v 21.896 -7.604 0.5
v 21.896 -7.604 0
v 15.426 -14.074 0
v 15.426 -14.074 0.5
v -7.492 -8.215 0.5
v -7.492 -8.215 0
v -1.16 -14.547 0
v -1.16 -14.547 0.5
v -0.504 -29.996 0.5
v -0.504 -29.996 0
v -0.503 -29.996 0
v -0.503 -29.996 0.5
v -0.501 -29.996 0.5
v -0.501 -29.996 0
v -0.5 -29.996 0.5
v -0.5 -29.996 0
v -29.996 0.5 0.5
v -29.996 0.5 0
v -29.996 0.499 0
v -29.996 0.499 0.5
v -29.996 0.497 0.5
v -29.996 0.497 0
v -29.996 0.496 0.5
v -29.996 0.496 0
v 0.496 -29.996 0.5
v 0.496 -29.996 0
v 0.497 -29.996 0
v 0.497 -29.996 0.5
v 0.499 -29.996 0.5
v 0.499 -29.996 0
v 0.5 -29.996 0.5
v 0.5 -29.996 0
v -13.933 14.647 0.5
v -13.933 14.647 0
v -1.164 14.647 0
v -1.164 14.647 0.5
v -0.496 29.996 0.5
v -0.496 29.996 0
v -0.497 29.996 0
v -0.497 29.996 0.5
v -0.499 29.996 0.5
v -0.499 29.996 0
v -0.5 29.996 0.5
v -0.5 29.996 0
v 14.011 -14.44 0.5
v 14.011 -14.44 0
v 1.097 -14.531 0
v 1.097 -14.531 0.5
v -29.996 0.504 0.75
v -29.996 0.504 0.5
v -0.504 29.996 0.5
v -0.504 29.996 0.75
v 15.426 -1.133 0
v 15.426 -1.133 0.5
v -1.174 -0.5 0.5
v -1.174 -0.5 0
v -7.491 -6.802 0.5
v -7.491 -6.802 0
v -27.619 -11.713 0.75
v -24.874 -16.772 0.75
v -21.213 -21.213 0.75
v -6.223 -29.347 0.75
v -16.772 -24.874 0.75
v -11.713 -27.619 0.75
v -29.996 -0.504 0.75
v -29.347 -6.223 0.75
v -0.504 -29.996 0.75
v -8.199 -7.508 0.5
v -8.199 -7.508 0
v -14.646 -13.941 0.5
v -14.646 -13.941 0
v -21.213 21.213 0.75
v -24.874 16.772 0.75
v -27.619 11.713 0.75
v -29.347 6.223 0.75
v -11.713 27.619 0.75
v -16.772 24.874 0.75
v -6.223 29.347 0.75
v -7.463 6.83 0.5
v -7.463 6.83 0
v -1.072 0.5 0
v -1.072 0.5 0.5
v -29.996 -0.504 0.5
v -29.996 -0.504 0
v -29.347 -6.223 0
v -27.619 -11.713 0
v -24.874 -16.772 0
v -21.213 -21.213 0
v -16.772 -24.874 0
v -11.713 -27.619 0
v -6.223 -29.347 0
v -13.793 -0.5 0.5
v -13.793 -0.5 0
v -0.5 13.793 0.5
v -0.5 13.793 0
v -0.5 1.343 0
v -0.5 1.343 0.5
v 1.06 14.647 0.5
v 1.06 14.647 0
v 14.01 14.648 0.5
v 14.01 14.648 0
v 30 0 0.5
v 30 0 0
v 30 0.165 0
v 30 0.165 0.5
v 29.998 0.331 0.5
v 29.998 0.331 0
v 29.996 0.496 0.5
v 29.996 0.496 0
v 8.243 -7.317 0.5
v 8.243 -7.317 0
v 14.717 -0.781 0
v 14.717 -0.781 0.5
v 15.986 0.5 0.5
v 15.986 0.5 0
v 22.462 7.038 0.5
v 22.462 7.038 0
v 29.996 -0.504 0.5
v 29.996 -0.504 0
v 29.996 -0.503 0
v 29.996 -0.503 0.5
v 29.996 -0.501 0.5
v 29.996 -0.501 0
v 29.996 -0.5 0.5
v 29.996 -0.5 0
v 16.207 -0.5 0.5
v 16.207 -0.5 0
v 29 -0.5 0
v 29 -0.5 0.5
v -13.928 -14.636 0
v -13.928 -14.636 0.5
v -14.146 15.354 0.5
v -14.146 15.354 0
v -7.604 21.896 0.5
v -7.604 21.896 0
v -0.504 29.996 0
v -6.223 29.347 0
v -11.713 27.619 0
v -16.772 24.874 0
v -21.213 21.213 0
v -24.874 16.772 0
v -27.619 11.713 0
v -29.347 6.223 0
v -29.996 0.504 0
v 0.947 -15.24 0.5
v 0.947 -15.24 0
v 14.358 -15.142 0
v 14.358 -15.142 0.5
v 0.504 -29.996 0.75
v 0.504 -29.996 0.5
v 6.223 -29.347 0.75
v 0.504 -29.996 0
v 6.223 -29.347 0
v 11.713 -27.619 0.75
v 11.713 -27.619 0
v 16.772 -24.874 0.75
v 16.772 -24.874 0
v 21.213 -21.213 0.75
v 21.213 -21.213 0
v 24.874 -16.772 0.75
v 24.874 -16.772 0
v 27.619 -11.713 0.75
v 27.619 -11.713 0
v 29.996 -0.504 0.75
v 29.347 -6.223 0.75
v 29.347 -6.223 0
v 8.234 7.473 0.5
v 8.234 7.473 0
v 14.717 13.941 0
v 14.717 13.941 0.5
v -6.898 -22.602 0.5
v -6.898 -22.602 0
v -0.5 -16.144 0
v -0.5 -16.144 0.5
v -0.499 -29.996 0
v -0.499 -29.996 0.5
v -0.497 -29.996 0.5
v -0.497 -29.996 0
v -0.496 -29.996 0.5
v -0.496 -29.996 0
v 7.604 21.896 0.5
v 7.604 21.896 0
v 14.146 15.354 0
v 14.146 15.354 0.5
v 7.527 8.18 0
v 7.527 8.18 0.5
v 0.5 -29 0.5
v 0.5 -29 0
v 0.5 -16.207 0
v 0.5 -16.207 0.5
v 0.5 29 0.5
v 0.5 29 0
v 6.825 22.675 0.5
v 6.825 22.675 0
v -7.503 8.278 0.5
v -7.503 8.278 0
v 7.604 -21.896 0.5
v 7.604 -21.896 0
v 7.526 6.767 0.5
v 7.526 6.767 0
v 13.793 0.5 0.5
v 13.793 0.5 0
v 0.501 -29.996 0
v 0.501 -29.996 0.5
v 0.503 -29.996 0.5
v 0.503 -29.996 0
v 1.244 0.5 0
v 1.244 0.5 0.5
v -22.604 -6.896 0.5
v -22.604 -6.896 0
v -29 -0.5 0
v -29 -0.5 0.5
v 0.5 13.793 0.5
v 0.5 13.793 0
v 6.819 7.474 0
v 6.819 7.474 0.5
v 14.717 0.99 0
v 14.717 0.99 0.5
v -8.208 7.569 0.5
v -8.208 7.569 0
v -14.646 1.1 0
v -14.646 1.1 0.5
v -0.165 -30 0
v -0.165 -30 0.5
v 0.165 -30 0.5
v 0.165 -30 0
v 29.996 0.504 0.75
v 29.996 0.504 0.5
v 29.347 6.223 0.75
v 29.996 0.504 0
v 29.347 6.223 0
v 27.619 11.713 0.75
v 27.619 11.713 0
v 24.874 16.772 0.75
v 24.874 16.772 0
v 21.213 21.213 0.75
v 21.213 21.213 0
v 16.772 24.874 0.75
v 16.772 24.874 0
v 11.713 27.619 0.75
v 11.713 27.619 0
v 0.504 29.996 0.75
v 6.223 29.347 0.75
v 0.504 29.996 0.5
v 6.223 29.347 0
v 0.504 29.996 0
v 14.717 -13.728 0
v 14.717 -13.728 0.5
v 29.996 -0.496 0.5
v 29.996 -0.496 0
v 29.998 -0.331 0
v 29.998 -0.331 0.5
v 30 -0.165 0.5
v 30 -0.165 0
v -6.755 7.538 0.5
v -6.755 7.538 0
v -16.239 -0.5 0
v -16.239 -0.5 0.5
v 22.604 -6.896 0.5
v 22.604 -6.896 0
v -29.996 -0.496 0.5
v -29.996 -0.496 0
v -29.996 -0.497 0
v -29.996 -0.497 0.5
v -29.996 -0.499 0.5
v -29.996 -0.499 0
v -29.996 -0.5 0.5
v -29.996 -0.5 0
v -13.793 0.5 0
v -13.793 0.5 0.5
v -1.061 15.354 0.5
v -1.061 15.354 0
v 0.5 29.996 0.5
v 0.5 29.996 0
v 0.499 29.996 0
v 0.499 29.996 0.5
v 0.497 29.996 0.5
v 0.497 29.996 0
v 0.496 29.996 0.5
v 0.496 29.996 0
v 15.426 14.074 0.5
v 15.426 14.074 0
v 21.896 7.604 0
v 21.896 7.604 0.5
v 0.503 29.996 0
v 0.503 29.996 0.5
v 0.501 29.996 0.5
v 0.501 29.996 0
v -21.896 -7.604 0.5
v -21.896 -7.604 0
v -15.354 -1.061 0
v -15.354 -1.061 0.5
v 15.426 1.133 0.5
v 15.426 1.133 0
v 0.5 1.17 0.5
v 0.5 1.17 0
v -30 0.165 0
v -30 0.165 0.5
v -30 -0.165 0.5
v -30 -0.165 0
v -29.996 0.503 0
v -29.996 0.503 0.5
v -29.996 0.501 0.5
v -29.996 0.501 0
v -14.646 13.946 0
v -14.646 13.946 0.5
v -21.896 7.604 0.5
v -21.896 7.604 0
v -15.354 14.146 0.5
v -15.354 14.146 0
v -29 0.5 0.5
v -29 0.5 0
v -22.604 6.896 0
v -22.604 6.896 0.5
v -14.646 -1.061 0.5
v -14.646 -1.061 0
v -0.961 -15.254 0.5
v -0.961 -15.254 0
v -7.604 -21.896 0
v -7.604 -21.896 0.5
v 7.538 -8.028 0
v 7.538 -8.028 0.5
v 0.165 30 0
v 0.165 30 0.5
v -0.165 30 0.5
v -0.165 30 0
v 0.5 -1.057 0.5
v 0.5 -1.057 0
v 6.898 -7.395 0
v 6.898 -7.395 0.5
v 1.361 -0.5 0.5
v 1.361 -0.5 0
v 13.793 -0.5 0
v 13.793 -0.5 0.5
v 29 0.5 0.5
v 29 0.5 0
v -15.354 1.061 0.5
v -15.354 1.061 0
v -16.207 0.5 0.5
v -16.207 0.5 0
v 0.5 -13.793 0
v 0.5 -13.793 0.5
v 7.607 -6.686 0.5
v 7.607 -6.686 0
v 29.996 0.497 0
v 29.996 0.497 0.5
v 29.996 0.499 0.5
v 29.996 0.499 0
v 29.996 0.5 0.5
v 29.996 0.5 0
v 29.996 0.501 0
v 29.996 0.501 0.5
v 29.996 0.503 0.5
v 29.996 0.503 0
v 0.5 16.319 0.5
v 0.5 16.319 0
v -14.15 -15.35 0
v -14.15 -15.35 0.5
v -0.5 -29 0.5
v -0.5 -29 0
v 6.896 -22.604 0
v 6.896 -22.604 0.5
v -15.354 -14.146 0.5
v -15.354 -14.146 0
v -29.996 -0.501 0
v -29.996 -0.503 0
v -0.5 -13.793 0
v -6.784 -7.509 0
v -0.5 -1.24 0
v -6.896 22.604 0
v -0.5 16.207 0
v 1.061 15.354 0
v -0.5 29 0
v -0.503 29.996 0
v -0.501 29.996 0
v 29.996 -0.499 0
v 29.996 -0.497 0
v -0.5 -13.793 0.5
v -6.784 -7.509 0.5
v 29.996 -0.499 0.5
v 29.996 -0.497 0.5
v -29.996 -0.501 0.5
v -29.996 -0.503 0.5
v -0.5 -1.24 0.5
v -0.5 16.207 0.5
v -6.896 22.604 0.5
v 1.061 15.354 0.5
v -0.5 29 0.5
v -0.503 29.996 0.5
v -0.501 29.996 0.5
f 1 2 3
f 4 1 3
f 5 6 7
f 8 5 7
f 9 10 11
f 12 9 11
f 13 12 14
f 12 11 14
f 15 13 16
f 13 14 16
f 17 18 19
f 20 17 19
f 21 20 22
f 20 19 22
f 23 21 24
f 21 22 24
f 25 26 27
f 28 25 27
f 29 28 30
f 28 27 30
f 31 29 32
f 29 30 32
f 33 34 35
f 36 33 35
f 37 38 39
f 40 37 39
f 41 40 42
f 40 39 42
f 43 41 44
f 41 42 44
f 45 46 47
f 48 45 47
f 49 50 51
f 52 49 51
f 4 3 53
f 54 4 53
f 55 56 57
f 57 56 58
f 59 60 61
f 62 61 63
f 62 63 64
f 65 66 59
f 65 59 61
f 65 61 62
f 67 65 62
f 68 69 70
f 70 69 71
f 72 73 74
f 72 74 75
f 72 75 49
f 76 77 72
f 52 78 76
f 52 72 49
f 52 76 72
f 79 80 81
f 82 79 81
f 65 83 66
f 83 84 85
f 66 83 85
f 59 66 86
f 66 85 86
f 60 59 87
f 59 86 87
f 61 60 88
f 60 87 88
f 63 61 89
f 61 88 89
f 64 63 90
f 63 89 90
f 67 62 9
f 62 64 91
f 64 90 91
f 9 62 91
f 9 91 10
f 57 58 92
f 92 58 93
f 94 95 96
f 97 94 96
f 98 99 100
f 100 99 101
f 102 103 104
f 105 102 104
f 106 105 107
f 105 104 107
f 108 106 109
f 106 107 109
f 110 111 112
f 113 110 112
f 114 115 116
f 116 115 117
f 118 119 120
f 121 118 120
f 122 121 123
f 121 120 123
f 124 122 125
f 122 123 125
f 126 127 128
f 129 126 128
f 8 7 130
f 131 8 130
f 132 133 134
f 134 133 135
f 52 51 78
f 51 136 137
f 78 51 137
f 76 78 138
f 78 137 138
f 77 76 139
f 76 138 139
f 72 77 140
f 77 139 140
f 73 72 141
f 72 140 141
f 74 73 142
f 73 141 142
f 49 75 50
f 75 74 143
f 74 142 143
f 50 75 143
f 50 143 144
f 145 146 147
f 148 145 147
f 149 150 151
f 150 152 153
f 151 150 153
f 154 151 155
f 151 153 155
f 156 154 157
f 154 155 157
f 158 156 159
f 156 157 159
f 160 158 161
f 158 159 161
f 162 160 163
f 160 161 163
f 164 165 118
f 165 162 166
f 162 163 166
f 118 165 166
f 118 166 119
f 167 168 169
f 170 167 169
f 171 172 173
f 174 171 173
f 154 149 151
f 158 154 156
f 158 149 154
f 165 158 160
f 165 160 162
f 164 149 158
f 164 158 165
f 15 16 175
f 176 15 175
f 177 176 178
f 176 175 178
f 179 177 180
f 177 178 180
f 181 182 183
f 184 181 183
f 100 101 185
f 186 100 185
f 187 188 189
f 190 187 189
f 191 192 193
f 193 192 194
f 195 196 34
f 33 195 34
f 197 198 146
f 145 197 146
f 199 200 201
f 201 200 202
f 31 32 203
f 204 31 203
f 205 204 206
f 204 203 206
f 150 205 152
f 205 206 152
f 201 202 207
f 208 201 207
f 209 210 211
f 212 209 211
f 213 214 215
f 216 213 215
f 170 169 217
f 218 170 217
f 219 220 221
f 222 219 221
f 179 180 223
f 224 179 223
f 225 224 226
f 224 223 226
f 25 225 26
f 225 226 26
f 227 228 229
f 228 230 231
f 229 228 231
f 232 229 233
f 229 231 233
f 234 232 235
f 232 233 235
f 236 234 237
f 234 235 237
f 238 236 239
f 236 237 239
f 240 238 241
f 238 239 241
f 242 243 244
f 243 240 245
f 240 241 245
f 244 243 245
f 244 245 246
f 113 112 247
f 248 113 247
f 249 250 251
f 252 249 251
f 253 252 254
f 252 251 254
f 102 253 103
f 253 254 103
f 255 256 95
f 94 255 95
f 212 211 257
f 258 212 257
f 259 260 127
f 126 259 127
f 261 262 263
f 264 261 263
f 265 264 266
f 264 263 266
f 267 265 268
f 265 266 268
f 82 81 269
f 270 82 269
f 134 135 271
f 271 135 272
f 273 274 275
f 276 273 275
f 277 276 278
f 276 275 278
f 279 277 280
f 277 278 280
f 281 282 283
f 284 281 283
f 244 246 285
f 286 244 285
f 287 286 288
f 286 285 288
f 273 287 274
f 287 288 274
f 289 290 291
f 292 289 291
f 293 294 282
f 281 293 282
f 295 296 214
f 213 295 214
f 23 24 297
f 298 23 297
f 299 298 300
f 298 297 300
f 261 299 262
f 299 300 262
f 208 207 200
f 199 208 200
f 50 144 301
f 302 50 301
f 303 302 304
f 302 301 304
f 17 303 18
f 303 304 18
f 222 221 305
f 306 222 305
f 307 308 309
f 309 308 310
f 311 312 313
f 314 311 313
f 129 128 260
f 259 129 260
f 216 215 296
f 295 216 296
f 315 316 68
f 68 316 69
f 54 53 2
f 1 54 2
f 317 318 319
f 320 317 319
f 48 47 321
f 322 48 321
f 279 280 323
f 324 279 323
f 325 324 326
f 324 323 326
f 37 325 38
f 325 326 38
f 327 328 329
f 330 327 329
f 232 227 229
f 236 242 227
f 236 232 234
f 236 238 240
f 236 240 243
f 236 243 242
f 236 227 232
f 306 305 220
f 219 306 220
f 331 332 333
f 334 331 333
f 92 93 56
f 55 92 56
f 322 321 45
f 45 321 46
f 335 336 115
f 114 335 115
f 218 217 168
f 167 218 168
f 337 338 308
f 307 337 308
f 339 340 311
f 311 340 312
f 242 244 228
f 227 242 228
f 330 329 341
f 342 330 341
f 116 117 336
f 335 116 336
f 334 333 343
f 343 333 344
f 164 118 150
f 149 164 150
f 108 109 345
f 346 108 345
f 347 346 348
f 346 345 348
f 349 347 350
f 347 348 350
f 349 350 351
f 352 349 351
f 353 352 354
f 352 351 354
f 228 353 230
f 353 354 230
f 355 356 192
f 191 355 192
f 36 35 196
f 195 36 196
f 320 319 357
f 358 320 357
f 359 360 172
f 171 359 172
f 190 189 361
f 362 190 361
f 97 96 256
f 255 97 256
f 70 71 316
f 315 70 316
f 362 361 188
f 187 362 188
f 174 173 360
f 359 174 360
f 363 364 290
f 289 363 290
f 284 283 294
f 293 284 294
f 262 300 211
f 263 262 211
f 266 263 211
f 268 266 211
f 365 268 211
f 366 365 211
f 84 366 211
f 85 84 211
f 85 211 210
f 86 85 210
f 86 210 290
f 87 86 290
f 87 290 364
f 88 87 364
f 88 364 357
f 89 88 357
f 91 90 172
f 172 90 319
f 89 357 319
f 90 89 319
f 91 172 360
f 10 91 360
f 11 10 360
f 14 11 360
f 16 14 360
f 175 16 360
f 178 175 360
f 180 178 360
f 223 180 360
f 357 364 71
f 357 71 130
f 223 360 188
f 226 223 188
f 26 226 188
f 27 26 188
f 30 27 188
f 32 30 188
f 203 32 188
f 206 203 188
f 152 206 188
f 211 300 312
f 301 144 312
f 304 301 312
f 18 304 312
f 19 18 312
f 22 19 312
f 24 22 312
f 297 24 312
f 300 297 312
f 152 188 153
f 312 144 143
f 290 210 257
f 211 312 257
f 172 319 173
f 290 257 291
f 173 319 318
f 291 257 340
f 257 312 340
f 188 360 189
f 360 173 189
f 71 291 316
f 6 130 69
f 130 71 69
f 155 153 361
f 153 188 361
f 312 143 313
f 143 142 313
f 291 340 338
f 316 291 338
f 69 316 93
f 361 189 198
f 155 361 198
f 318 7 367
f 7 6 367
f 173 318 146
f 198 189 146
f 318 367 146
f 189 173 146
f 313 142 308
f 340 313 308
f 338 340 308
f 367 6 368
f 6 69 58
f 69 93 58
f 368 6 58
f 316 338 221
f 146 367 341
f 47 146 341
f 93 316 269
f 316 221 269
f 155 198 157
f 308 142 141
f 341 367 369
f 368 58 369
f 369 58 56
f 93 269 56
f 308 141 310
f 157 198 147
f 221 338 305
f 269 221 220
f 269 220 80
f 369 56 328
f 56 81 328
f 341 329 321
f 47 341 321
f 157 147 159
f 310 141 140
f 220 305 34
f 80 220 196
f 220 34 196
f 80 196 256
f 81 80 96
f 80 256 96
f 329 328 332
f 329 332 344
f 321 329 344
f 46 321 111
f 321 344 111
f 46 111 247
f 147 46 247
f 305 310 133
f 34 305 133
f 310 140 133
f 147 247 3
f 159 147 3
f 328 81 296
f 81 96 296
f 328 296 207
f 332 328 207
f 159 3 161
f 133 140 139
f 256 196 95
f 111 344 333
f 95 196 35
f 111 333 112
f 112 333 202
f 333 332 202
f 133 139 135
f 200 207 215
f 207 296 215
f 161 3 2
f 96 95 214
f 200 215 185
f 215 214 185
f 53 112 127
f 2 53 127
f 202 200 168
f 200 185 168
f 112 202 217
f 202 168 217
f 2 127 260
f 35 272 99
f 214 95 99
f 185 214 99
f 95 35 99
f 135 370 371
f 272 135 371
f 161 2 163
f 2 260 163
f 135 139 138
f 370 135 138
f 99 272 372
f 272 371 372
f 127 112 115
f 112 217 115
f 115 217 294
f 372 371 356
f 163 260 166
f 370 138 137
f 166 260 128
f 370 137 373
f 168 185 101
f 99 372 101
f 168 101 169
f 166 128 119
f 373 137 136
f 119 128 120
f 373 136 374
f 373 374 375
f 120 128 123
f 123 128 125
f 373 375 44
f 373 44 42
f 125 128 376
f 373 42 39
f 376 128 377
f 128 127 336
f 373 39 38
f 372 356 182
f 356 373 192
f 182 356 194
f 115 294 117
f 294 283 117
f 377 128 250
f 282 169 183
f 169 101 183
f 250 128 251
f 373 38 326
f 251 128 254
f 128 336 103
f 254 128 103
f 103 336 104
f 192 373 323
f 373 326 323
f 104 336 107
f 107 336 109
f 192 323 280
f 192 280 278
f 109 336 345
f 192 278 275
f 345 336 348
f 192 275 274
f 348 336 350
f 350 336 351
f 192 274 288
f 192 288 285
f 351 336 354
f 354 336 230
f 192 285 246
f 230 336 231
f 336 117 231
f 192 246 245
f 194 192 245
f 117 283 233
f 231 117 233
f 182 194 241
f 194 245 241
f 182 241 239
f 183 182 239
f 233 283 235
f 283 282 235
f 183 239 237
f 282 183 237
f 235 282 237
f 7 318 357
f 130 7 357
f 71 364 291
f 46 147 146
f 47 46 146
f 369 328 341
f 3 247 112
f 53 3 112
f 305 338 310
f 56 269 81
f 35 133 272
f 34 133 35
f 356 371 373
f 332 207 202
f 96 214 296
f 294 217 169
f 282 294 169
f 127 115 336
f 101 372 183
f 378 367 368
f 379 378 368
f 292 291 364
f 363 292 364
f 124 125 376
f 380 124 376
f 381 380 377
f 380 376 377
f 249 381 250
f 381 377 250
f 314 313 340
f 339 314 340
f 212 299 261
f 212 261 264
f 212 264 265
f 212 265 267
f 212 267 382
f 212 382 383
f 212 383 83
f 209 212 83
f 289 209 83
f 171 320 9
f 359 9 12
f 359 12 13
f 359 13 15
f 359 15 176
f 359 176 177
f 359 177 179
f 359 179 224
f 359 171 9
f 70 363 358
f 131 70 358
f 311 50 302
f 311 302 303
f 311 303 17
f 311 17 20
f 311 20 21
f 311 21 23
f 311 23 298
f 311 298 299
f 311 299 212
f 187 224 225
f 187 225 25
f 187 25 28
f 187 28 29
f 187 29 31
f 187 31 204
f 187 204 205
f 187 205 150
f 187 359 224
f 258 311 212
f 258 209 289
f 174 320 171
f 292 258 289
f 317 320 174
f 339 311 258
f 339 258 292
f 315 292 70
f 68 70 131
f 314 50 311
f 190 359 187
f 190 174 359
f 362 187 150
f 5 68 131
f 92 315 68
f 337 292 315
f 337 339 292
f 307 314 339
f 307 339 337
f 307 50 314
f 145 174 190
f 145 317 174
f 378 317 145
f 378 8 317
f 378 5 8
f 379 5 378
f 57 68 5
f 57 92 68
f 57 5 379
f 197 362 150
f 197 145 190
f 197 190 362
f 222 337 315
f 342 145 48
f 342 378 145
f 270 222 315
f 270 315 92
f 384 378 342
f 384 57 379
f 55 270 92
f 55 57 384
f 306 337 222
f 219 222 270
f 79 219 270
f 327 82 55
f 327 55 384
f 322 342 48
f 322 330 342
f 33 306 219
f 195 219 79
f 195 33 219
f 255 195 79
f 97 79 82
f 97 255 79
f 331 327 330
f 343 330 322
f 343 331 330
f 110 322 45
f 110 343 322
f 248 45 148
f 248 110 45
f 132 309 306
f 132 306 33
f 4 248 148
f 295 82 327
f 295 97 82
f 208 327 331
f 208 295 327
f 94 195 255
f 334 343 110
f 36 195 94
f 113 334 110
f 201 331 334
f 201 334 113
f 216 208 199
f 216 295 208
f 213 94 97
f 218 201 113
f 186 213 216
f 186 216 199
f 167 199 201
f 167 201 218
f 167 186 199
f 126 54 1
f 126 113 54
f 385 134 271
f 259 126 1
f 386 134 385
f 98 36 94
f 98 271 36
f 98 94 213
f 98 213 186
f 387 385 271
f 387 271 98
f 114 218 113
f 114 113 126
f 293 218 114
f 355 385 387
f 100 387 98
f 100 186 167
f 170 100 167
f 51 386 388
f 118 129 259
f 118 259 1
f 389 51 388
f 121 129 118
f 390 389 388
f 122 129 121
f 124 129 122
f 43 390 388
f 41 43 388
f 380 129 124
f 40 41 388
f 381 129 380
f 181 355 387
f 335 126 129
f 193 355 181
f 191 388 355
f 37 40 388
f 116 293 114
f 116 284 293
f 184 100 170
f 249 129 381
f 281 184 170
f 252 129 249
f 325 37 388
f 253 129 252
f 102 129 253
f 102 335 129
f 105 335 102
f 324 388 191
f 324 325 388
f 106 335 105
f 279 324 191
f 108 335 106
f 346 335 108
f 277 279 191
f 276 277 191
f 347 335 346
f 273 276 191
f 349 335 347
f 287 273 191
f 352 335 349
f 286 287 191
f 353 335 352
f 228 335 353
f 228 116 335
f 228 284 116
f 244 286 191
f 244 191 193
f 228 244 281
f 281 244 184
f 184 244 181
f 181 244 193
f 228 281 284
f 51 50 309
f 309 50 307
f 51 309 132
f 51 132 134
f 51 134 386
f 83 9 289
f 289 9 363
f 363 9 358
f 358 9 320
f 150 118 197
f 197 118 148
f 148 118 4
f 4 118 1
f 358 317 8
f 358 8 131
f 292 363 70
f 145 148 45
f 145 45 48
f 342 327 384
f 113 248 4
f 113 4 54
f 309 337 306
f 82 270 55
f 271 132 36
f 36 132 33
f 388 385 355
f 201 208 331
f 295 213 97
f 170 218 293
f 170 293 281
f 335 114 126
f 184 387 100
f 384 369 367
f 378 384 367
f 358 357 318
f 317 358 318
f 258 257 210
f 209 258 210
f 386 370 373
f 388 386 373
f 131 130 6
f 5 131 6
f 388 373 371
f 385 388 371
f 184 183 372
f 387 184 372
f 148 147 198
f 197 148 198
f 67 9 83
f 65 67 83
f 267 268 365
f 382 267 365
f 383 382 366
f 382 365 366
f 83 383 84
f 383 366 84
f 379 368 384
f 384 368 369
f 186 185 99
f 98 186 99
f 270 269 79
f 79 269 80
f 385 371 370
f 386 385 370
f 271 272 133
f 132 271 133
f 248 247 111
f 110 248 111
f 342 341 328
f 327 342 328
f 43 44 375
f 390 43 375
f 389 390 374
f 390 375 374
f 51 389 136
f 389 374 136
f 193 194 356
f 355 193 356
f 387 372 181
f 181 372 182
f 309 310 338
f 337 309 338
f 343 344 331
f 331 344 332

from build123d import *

# Parameters (mm, degrees)
F1_DEPTH = 0.5
F2_DEPTH = 0.75


with BuildPart() as f1:
    # F0 (on Top) → F1 (new body)
    with BuildSketch(Plane.XY):
        with BuildLine():
            ThreePointArc((29.9959010885, -0.4959010884), (29.9989752546, -0.247959014), (30, 0))
            ThreePointArc((30, 0), (29.9989752546, 0.2479590141), (29.9959010885, 0.4959010885))
            ThreePointArc((29.9959010885, 0.4959010885), (29.9958671362, 0.4979505454), (29.9958330439, 0.5))
            ThreePointArc((29.9958330439, 0.5), (29.9957976483, 0.5021189497), (29.9957621031, 0.5042378969))
            Line((29.9957621031, 0.5042378969), (0.5042378969, 29.9957621031))
            ThreePointArc((0.5042378969, 29.9957621031), (0.5021189497, 29.9957976483), (0.5, 29.9958330439))
            ThreePointArc((0.5, 29.9958330439), (0.4979505454, 29.9958671362), (0.4959010885, 29.9959010885))
            ThreePointArc((0.4959010885, 29.9959010885), (0, 30), (-0.4959010885, 29.9959010885))
            ThreePointArc((-0.4959010885, 29.9959010885), (-0.4979505454, 29.9958671362), (-0.5, 29.9958330439))
            ThreePointArc((-0.5, 29.9958330439), (-0.5021189497, 29.9957976483), (-0.5042378969, 29.9957621031))
            Line((-0.5042378969, 29.9957621031), (-29.9957621031, 0.5042378969))
            ThreePointArc((-29.9957621031, 0.5042378969), (-29.9957976483, 0.5021189497), (-29.9958330439, 0.5))
            ThreePointArc((-29.9958330439, 0.5), (-29.9958671362, 0.4979505455), (-29.9959010885, 0.4959010886))
            ThreePointArc((-29.9959010885, 0.4959010886), (-30, 1e-10), (-29.9959010885, -0.4959010884))
            ThreePointArc((-29.9959010885, -0.4959010884), (-29.9958671362, -0.4979505453), (-29.9958330439, -0.4999999999))
            ThreePointArc((-29.9958330439, -0.4999999999), (-29.9957976483, -0.5021189497), (-29.9957621031, -0.5042378969))
            Line((-29.9957621031, -0.5042378969), (-0.5042378969, -29.9957621031))
            ThreePointArc((-0.5042378969, -29.9957621031), (-0.5021189497, -29.9957976483), (-0.5, -29.9958330439))
            ThreePointArc((-0.5, -29.9958330439), (-0.4979505454, -29.9958671362), (-0.4959010885, -29.9959010885))
            ThreePointArc((-0.4959010885, -29.9959010885), (1.6e-09, -30), (0.4959010917, -29.9959010884))
            ThreePointArc((0.4959010917, -29.9959010884), (0.497950547, -29.9958671362), (0.5, -29.9958330439))
            ThreePointArc((0.5, -29.9958330439), (0.5021189497, -29.9957976483), (0.5042378969, -29.9957621031))
            Line((0.5042378969, -29.9957621031), (29.9957621031, -0.5042378969))
            ThreePointArc((29.9957621031, -0.5042378969), (29.9957976483, -0.5021189497), (29.9958330439, -0.5))
            ThreePointArc((29.9958330439, -0.5), (29.9958671362, -0.4979505454), (29.9959010885, -0.4959010884))
        make_face()
        Polygon((-0.4999999985, -28.9999999984), (-6.8976368761, -22.6023631214), (-0.4999999992, -16.1435156014), align=None, mode=Mode.SUBTRACT)
        Polygon((-0.9606463591, -15.253539578), (-7.6035533893, -21.8964466082), (-14.1500740262, -15.349925972), align=None, mode=Mode.SUBTRACT)
        Polygon((-15.3535533902, -1.0606601714), (-15.3535533898, -14.1464466085), (-21.8964466089, -7.6035533901), align=None, mode=Mode.SUBTRACT)
        Polygon((-16.2388987995, -0.5), (-22.6041527374, -6.8958472617), (-28.9999999999, -0.4999999999), align=None, mode=Mode.SUBTRACT)
        Polygon((-1.1603910767, -14.5467157044), (-13.9276378166, -14.6364271465), (-7.4916261871, -8.2154805941), align=None, mode=Mode.SUBTRACT)
        Polygon((-8.1987320116, -7.5083747696), (-14.6464466094, -13.9409951753), (-14.6464466094, -1.0606601718), align=None, mode=Mode.SUBTRACT)
        Polygon((-6.783690857, -7.5092023618), (-0.5, -1.2402200376), (-0.4999999993, -13.7928932195), align=None, mode=Mode.SUBTRACT)
        Polygon((-13.7928932189, -0.5), (-1.1739120379, -0.5), (-7.4907965869, -6.8020966319), align=None, mode=Mode.SUBTRACT)
        Polygon((0.5, -16.2071067812), (6.8964466094, -22.6035533906), (0.5, -29), align=None, mode=Mode.SUBTRACT)
        Polygon((0.9467076968, -15.2396009156), (14.3584098275, -15.1415901725), (7.6035533906, -21.8964466094), align=None, mode=Mode.SUBTRACT)
        Polygon((14.0112935653, -14.4401090307), (1.0973812984, -14.5308510455), (7.5382237147, -8.0283846086), align=None, mode=Mode.SUBTRACT)
        Polygon((0.5, -13.7928932189), (0.5, -1.0568622983), (6.8983340381, -7.3945591808), align=None, mode=Mode.SUBTRACT)
        Polygon((14.7168418348, -0.7810836543), (14.7168418349, -13.7281676466), (8.2432305686, -7.3166324636), align=None, mode=Mode.SUBTRACT)
        Polygon((1.360599895, -0.5), (13.7928932189, -0.5), (7.6066937554, -6.6861994634), align=None, mode=Mode.SUBTRACT)
        Polygon((15.4256417891, -1.1327485702), (21.8964466095, -7.6035533905), (15.4256417891, -14.0743582109), align=None, mode=Mode.SUBTRACT)
        Polygon((29, -0.5), (22.6035533906, -6.8964466094), (16.2071067811, -0.5), align=None, mode=Mode.SUBTRACT)
        Polygon((-29, 0.5), (-22.6035533906, 6.8964466094), (-16.2071067813, 0.5), align=None, mode=Mode.SUBTRACT)
        Polygon((-21.8964466094, 7.6035533906), (-15.3535533906, 14.1464466094), (-15.3535533903, 1.0606601714), align=None, mode=Mode.SUBTRACT)
        Polygon((-13.7928932187, 0.5), (-7.4626086697, 6.8302845491), (-1.0717578841, 0.5000000001), align=None, mode=Mode.SUBTRACT)
        Polygon((-14.6464466094, 1.1001059941), (-14.6464466094, 13.9460410951), (-8.2084439991, 7.5690515803), align=None, mode=Mode.SUBTRACT)
        Polygon((-13.9325727794, 14.6465249656), (-1.1641236528, 14.6472290479), (-7.5026392249, 8.2782486645), align=None, mode=Mode.SUBTRACT)
        Polygon((-6.7550575733, 7.5378356455), (-0.5, 13.7928932188), (-0.5, 1.3427584231), align=None, mode=Mode.SUBTRACT)
        Polygon((-1.0606601718, 15.3535533906), (-14.1464466094, 15.3535533906), (-7.6035533906, 21.8964466094), align=None, mode=Mode.SUBTRACT)
        Polygon((-6.8964466094, 22.6035533906), (-0.5, 29), (-0.5, 16.2071067812), align=None, mode=Mode.SUBTRACT)
        Polygon((0.5000000005, 1.1699933855), (0.500000001, 13.7928932188), (6.8188461713, 7.4740470475), align=None, mode=Mode.SUBTRACT)
        Polygon((13.7928932184, 0.4999999994), (1.2443030111, 0.499999999), (7.5259499895, 6.7669432292), align=None, mode=Mode.SUBTRACT)
        Polygon((14.7168418348, 0.9902649463), (8.2338853191, 7.473221462), (14.7168418347, 13.941003014), align=None, mode=Mode.SUBTRACT)
        Polygon((14.0096987803, 14.6480657682), (7.5267815959, 8.1803251852), (1.0597551034, 14.6473516778), align=None, mode=Mode.SUBTRACT)
        Polygon((15.9857846309, 0.5000000004), (22.4619115095, 7.0380884906), (29, 0.5), align=None, mode=Mode.SUBTRACT)
        Polygon((15.4256417891, 1.1327485702), (15.4256417891, 14.074358211), (21.8964466094, 7.6035533906), align=None, mode=Mode.SUBTRACT)
        Polygon((1.0606601718, 15.3535533906), (7.6035533906, 21.8964466094), (14.1464466094, 15.3535533907), align=None, mode=Mode.SUBTRACT)
        Polygon((0.5, 16.3193509792), (0.5, 29), (6.825124286, 22.674875714), align=None, mode=Mode.SUBTRACT)
    extrude(amount=F1_DEPTH)

    # F0 (on Top) → F2 (join)
    with BuildSketch(Plane.XY):
        with BuildLine():
            ThreePointArc((0.5042378969, -29.9957621031), (21.2132034356, -21.2132034356), (29.9957621031, -0.5042378969))
            Line((29.9957621031, -0.5042378969), (0.5042378969, -29.9957621031))
        make_face()
        with BuildLine():
            Line((0.5042378969, 29.9957621031), (29.9957621031, 0.5042378969))
            ThreePointArc((29.9957621031, 0.5042378969), (21.2132034356, 21.2132034356), (0.5042378969, 29.9957621031))
        make_face()
        with BuildLine():
            Line((-29.9957621031, 0.5042378969), (-0.5042378969, 29.9957621031))
            ThreePointArc((-0.5042378969, 29.9957621031), (-21.2132034356, 21.2132034356), (-29.9957621031, 0.5042378969))
        make_face()
        with BuildLine():
            ThreePointArc((-29.9957621031, -0.5042378969), (-21.2132034356, -21.2132034356), (-0.5042378969, -29.9957621031))
            Line((-0.5042378969, -29.9957621031), (-29.9957621031, -0.5042378969))
        make_face()
    extrude(amount=F2_DEPTH)


solid = f1.part
